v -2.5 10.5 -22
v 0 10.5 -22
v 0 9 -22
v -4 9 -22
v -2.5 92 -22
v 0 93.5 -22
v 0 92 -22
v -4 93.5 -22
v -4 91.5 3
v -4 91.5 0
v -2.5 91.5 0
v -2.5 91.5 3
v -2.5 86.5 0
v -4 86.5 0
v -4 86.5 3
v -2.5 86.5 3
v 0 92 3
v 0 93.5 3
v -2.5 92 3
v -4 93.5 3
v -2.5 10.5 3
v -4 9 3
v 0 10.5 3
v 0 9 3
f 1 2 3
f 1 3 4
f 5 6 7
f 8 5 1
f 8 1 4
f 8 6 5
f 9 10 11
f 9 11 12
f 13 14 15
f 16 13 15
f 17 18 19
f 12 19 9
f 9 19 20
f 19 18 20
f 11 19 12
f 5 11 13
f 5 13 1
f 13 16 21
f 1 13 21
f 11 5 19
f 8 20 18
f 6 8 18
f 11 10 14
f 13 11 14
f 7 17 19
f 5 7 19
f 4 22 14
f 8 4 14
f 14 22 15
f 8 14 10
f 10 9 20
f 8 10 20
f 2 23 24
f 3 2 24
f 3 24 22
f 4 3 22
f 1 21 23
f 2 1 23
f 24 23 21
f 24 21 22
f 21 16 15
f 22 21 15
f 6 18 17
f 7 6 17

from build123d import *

# Parameters (mm, degrees)
SKETCH102_W      = 5
SKETCH102_H      = 4
EXTRUDE093_DEPTH = 5
EXTRUDE064_DEPTH = 25


with BuildPart() as extrude093:
    # Sketch102 → Extrude093 (new body)
    with BuildSketch(Plane(origin=(-6, 0, 0), x_dir=(0, -1, 0), z_dir=(-1, 0, 0))):
        with Locations((-89, 2)):
            Rectangle(SKETCH102_W, SKETCH102_H)
    extrude(amount=-EXTRUDE093_DEPTH)


with BuildPart() as cut015:
    # Sketch074 → Extrude064 (new body)
    with BuildSketch(Plane.XY.offset(3)):
        Polygon((-4, 93.5), (0, 93.5), (0, 92), (-2.5, 92), (-2.5, 10.5), (0, 10.5), (0, 9), (-4, 9), align=None)
    extrude(amount=-EXTRUDE064_DEPTH)

    # Cut015: cut Extrude093
    add(extrude093.part, mode=Mode.SUBTRACT)


solid = cut015.part
